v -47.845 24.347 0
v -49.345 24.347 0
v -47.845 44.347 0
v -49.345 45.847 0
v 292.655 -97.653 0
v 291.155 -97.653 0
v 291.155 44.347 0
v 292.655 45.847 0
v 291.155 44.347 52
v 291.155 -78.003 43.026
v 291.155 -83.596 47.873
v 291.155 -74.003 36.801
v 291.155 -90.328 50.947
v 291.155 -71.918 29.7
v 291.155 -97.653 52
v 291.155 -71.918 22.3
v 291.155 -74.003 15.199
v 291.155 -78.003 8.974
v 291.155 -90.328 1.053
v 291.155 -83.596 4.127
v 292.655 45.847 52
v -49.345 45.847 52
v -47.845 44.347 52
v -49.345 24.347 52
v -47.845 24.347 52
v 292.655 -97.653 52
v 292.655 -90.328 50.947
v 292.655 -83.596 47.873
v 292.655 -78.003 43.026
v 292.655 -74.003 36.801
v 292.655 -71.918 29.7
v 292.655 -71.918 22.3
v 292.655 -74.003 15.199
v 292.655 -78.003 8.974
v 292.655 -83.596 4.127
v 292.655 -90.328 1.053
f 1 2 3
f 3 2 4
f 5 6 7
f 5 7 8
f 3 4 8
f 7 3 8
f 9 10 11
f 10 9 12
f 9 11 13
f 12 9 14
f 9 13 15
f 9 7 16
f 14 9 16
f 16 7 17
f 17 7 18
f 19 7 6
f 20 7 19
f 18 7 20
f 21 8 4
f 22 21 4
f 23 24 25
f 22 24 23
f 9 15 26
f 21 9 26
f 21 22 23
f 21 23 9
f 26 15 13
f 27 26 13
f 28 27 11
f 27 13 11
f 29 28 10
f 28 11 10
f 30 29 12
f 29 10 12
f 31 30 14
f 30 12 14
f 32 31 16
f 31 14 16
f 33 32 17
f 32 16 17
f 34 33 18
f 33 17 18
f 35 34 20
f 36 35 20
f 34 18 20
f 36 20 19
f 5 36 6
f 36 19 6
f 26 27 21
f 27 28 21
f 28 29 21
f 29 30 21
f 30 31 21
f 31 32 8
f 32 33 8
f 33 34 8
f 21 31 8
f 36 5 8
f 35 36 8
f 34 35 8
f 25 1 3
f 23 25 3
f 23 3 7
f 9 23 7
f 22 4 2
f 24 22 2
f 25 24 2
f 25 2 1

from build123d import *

# Parameters (mm, degrees)
EXTRUDE_1_DEPTH     = 52
SKETCH_2_R          = 26
CUT_EXTRUDE_1_DEPTH = 52


with BuildPart() as part:
    # 草图1 → 凸台-拉伸1 (new body)
    with BuildSketch(Plane.XY):
        Polygon((-37.84512636, 44.347033455), (206.15487364, 44.347033455), (291.15487364, 44.347033455), (291.15487364, -97.652966545), (292.65487364, -97.652966545), (292.65487364, 45.847033455), (-49.34512636, 45.847033455), (-49.34512636, 24.347033455), (-47.84512636, 24.347033455), (-47.84512636, 44.347033455), align=None)
    extrude(amount=EXTRUDE_1_DEPTH)

    # 草图2 → 切除-拉伸1 (cut)
    with BuildSketch(Plane.ZY.offset(-291.15487364)):
        with Locations((26, -97.652966545)):
            Circle(SKETCH_2_R)
    extrude(amount=-CUT_EXTRUDE_1_DEPTH, mode=Mode.SUBTRACT)


solid = part.part
